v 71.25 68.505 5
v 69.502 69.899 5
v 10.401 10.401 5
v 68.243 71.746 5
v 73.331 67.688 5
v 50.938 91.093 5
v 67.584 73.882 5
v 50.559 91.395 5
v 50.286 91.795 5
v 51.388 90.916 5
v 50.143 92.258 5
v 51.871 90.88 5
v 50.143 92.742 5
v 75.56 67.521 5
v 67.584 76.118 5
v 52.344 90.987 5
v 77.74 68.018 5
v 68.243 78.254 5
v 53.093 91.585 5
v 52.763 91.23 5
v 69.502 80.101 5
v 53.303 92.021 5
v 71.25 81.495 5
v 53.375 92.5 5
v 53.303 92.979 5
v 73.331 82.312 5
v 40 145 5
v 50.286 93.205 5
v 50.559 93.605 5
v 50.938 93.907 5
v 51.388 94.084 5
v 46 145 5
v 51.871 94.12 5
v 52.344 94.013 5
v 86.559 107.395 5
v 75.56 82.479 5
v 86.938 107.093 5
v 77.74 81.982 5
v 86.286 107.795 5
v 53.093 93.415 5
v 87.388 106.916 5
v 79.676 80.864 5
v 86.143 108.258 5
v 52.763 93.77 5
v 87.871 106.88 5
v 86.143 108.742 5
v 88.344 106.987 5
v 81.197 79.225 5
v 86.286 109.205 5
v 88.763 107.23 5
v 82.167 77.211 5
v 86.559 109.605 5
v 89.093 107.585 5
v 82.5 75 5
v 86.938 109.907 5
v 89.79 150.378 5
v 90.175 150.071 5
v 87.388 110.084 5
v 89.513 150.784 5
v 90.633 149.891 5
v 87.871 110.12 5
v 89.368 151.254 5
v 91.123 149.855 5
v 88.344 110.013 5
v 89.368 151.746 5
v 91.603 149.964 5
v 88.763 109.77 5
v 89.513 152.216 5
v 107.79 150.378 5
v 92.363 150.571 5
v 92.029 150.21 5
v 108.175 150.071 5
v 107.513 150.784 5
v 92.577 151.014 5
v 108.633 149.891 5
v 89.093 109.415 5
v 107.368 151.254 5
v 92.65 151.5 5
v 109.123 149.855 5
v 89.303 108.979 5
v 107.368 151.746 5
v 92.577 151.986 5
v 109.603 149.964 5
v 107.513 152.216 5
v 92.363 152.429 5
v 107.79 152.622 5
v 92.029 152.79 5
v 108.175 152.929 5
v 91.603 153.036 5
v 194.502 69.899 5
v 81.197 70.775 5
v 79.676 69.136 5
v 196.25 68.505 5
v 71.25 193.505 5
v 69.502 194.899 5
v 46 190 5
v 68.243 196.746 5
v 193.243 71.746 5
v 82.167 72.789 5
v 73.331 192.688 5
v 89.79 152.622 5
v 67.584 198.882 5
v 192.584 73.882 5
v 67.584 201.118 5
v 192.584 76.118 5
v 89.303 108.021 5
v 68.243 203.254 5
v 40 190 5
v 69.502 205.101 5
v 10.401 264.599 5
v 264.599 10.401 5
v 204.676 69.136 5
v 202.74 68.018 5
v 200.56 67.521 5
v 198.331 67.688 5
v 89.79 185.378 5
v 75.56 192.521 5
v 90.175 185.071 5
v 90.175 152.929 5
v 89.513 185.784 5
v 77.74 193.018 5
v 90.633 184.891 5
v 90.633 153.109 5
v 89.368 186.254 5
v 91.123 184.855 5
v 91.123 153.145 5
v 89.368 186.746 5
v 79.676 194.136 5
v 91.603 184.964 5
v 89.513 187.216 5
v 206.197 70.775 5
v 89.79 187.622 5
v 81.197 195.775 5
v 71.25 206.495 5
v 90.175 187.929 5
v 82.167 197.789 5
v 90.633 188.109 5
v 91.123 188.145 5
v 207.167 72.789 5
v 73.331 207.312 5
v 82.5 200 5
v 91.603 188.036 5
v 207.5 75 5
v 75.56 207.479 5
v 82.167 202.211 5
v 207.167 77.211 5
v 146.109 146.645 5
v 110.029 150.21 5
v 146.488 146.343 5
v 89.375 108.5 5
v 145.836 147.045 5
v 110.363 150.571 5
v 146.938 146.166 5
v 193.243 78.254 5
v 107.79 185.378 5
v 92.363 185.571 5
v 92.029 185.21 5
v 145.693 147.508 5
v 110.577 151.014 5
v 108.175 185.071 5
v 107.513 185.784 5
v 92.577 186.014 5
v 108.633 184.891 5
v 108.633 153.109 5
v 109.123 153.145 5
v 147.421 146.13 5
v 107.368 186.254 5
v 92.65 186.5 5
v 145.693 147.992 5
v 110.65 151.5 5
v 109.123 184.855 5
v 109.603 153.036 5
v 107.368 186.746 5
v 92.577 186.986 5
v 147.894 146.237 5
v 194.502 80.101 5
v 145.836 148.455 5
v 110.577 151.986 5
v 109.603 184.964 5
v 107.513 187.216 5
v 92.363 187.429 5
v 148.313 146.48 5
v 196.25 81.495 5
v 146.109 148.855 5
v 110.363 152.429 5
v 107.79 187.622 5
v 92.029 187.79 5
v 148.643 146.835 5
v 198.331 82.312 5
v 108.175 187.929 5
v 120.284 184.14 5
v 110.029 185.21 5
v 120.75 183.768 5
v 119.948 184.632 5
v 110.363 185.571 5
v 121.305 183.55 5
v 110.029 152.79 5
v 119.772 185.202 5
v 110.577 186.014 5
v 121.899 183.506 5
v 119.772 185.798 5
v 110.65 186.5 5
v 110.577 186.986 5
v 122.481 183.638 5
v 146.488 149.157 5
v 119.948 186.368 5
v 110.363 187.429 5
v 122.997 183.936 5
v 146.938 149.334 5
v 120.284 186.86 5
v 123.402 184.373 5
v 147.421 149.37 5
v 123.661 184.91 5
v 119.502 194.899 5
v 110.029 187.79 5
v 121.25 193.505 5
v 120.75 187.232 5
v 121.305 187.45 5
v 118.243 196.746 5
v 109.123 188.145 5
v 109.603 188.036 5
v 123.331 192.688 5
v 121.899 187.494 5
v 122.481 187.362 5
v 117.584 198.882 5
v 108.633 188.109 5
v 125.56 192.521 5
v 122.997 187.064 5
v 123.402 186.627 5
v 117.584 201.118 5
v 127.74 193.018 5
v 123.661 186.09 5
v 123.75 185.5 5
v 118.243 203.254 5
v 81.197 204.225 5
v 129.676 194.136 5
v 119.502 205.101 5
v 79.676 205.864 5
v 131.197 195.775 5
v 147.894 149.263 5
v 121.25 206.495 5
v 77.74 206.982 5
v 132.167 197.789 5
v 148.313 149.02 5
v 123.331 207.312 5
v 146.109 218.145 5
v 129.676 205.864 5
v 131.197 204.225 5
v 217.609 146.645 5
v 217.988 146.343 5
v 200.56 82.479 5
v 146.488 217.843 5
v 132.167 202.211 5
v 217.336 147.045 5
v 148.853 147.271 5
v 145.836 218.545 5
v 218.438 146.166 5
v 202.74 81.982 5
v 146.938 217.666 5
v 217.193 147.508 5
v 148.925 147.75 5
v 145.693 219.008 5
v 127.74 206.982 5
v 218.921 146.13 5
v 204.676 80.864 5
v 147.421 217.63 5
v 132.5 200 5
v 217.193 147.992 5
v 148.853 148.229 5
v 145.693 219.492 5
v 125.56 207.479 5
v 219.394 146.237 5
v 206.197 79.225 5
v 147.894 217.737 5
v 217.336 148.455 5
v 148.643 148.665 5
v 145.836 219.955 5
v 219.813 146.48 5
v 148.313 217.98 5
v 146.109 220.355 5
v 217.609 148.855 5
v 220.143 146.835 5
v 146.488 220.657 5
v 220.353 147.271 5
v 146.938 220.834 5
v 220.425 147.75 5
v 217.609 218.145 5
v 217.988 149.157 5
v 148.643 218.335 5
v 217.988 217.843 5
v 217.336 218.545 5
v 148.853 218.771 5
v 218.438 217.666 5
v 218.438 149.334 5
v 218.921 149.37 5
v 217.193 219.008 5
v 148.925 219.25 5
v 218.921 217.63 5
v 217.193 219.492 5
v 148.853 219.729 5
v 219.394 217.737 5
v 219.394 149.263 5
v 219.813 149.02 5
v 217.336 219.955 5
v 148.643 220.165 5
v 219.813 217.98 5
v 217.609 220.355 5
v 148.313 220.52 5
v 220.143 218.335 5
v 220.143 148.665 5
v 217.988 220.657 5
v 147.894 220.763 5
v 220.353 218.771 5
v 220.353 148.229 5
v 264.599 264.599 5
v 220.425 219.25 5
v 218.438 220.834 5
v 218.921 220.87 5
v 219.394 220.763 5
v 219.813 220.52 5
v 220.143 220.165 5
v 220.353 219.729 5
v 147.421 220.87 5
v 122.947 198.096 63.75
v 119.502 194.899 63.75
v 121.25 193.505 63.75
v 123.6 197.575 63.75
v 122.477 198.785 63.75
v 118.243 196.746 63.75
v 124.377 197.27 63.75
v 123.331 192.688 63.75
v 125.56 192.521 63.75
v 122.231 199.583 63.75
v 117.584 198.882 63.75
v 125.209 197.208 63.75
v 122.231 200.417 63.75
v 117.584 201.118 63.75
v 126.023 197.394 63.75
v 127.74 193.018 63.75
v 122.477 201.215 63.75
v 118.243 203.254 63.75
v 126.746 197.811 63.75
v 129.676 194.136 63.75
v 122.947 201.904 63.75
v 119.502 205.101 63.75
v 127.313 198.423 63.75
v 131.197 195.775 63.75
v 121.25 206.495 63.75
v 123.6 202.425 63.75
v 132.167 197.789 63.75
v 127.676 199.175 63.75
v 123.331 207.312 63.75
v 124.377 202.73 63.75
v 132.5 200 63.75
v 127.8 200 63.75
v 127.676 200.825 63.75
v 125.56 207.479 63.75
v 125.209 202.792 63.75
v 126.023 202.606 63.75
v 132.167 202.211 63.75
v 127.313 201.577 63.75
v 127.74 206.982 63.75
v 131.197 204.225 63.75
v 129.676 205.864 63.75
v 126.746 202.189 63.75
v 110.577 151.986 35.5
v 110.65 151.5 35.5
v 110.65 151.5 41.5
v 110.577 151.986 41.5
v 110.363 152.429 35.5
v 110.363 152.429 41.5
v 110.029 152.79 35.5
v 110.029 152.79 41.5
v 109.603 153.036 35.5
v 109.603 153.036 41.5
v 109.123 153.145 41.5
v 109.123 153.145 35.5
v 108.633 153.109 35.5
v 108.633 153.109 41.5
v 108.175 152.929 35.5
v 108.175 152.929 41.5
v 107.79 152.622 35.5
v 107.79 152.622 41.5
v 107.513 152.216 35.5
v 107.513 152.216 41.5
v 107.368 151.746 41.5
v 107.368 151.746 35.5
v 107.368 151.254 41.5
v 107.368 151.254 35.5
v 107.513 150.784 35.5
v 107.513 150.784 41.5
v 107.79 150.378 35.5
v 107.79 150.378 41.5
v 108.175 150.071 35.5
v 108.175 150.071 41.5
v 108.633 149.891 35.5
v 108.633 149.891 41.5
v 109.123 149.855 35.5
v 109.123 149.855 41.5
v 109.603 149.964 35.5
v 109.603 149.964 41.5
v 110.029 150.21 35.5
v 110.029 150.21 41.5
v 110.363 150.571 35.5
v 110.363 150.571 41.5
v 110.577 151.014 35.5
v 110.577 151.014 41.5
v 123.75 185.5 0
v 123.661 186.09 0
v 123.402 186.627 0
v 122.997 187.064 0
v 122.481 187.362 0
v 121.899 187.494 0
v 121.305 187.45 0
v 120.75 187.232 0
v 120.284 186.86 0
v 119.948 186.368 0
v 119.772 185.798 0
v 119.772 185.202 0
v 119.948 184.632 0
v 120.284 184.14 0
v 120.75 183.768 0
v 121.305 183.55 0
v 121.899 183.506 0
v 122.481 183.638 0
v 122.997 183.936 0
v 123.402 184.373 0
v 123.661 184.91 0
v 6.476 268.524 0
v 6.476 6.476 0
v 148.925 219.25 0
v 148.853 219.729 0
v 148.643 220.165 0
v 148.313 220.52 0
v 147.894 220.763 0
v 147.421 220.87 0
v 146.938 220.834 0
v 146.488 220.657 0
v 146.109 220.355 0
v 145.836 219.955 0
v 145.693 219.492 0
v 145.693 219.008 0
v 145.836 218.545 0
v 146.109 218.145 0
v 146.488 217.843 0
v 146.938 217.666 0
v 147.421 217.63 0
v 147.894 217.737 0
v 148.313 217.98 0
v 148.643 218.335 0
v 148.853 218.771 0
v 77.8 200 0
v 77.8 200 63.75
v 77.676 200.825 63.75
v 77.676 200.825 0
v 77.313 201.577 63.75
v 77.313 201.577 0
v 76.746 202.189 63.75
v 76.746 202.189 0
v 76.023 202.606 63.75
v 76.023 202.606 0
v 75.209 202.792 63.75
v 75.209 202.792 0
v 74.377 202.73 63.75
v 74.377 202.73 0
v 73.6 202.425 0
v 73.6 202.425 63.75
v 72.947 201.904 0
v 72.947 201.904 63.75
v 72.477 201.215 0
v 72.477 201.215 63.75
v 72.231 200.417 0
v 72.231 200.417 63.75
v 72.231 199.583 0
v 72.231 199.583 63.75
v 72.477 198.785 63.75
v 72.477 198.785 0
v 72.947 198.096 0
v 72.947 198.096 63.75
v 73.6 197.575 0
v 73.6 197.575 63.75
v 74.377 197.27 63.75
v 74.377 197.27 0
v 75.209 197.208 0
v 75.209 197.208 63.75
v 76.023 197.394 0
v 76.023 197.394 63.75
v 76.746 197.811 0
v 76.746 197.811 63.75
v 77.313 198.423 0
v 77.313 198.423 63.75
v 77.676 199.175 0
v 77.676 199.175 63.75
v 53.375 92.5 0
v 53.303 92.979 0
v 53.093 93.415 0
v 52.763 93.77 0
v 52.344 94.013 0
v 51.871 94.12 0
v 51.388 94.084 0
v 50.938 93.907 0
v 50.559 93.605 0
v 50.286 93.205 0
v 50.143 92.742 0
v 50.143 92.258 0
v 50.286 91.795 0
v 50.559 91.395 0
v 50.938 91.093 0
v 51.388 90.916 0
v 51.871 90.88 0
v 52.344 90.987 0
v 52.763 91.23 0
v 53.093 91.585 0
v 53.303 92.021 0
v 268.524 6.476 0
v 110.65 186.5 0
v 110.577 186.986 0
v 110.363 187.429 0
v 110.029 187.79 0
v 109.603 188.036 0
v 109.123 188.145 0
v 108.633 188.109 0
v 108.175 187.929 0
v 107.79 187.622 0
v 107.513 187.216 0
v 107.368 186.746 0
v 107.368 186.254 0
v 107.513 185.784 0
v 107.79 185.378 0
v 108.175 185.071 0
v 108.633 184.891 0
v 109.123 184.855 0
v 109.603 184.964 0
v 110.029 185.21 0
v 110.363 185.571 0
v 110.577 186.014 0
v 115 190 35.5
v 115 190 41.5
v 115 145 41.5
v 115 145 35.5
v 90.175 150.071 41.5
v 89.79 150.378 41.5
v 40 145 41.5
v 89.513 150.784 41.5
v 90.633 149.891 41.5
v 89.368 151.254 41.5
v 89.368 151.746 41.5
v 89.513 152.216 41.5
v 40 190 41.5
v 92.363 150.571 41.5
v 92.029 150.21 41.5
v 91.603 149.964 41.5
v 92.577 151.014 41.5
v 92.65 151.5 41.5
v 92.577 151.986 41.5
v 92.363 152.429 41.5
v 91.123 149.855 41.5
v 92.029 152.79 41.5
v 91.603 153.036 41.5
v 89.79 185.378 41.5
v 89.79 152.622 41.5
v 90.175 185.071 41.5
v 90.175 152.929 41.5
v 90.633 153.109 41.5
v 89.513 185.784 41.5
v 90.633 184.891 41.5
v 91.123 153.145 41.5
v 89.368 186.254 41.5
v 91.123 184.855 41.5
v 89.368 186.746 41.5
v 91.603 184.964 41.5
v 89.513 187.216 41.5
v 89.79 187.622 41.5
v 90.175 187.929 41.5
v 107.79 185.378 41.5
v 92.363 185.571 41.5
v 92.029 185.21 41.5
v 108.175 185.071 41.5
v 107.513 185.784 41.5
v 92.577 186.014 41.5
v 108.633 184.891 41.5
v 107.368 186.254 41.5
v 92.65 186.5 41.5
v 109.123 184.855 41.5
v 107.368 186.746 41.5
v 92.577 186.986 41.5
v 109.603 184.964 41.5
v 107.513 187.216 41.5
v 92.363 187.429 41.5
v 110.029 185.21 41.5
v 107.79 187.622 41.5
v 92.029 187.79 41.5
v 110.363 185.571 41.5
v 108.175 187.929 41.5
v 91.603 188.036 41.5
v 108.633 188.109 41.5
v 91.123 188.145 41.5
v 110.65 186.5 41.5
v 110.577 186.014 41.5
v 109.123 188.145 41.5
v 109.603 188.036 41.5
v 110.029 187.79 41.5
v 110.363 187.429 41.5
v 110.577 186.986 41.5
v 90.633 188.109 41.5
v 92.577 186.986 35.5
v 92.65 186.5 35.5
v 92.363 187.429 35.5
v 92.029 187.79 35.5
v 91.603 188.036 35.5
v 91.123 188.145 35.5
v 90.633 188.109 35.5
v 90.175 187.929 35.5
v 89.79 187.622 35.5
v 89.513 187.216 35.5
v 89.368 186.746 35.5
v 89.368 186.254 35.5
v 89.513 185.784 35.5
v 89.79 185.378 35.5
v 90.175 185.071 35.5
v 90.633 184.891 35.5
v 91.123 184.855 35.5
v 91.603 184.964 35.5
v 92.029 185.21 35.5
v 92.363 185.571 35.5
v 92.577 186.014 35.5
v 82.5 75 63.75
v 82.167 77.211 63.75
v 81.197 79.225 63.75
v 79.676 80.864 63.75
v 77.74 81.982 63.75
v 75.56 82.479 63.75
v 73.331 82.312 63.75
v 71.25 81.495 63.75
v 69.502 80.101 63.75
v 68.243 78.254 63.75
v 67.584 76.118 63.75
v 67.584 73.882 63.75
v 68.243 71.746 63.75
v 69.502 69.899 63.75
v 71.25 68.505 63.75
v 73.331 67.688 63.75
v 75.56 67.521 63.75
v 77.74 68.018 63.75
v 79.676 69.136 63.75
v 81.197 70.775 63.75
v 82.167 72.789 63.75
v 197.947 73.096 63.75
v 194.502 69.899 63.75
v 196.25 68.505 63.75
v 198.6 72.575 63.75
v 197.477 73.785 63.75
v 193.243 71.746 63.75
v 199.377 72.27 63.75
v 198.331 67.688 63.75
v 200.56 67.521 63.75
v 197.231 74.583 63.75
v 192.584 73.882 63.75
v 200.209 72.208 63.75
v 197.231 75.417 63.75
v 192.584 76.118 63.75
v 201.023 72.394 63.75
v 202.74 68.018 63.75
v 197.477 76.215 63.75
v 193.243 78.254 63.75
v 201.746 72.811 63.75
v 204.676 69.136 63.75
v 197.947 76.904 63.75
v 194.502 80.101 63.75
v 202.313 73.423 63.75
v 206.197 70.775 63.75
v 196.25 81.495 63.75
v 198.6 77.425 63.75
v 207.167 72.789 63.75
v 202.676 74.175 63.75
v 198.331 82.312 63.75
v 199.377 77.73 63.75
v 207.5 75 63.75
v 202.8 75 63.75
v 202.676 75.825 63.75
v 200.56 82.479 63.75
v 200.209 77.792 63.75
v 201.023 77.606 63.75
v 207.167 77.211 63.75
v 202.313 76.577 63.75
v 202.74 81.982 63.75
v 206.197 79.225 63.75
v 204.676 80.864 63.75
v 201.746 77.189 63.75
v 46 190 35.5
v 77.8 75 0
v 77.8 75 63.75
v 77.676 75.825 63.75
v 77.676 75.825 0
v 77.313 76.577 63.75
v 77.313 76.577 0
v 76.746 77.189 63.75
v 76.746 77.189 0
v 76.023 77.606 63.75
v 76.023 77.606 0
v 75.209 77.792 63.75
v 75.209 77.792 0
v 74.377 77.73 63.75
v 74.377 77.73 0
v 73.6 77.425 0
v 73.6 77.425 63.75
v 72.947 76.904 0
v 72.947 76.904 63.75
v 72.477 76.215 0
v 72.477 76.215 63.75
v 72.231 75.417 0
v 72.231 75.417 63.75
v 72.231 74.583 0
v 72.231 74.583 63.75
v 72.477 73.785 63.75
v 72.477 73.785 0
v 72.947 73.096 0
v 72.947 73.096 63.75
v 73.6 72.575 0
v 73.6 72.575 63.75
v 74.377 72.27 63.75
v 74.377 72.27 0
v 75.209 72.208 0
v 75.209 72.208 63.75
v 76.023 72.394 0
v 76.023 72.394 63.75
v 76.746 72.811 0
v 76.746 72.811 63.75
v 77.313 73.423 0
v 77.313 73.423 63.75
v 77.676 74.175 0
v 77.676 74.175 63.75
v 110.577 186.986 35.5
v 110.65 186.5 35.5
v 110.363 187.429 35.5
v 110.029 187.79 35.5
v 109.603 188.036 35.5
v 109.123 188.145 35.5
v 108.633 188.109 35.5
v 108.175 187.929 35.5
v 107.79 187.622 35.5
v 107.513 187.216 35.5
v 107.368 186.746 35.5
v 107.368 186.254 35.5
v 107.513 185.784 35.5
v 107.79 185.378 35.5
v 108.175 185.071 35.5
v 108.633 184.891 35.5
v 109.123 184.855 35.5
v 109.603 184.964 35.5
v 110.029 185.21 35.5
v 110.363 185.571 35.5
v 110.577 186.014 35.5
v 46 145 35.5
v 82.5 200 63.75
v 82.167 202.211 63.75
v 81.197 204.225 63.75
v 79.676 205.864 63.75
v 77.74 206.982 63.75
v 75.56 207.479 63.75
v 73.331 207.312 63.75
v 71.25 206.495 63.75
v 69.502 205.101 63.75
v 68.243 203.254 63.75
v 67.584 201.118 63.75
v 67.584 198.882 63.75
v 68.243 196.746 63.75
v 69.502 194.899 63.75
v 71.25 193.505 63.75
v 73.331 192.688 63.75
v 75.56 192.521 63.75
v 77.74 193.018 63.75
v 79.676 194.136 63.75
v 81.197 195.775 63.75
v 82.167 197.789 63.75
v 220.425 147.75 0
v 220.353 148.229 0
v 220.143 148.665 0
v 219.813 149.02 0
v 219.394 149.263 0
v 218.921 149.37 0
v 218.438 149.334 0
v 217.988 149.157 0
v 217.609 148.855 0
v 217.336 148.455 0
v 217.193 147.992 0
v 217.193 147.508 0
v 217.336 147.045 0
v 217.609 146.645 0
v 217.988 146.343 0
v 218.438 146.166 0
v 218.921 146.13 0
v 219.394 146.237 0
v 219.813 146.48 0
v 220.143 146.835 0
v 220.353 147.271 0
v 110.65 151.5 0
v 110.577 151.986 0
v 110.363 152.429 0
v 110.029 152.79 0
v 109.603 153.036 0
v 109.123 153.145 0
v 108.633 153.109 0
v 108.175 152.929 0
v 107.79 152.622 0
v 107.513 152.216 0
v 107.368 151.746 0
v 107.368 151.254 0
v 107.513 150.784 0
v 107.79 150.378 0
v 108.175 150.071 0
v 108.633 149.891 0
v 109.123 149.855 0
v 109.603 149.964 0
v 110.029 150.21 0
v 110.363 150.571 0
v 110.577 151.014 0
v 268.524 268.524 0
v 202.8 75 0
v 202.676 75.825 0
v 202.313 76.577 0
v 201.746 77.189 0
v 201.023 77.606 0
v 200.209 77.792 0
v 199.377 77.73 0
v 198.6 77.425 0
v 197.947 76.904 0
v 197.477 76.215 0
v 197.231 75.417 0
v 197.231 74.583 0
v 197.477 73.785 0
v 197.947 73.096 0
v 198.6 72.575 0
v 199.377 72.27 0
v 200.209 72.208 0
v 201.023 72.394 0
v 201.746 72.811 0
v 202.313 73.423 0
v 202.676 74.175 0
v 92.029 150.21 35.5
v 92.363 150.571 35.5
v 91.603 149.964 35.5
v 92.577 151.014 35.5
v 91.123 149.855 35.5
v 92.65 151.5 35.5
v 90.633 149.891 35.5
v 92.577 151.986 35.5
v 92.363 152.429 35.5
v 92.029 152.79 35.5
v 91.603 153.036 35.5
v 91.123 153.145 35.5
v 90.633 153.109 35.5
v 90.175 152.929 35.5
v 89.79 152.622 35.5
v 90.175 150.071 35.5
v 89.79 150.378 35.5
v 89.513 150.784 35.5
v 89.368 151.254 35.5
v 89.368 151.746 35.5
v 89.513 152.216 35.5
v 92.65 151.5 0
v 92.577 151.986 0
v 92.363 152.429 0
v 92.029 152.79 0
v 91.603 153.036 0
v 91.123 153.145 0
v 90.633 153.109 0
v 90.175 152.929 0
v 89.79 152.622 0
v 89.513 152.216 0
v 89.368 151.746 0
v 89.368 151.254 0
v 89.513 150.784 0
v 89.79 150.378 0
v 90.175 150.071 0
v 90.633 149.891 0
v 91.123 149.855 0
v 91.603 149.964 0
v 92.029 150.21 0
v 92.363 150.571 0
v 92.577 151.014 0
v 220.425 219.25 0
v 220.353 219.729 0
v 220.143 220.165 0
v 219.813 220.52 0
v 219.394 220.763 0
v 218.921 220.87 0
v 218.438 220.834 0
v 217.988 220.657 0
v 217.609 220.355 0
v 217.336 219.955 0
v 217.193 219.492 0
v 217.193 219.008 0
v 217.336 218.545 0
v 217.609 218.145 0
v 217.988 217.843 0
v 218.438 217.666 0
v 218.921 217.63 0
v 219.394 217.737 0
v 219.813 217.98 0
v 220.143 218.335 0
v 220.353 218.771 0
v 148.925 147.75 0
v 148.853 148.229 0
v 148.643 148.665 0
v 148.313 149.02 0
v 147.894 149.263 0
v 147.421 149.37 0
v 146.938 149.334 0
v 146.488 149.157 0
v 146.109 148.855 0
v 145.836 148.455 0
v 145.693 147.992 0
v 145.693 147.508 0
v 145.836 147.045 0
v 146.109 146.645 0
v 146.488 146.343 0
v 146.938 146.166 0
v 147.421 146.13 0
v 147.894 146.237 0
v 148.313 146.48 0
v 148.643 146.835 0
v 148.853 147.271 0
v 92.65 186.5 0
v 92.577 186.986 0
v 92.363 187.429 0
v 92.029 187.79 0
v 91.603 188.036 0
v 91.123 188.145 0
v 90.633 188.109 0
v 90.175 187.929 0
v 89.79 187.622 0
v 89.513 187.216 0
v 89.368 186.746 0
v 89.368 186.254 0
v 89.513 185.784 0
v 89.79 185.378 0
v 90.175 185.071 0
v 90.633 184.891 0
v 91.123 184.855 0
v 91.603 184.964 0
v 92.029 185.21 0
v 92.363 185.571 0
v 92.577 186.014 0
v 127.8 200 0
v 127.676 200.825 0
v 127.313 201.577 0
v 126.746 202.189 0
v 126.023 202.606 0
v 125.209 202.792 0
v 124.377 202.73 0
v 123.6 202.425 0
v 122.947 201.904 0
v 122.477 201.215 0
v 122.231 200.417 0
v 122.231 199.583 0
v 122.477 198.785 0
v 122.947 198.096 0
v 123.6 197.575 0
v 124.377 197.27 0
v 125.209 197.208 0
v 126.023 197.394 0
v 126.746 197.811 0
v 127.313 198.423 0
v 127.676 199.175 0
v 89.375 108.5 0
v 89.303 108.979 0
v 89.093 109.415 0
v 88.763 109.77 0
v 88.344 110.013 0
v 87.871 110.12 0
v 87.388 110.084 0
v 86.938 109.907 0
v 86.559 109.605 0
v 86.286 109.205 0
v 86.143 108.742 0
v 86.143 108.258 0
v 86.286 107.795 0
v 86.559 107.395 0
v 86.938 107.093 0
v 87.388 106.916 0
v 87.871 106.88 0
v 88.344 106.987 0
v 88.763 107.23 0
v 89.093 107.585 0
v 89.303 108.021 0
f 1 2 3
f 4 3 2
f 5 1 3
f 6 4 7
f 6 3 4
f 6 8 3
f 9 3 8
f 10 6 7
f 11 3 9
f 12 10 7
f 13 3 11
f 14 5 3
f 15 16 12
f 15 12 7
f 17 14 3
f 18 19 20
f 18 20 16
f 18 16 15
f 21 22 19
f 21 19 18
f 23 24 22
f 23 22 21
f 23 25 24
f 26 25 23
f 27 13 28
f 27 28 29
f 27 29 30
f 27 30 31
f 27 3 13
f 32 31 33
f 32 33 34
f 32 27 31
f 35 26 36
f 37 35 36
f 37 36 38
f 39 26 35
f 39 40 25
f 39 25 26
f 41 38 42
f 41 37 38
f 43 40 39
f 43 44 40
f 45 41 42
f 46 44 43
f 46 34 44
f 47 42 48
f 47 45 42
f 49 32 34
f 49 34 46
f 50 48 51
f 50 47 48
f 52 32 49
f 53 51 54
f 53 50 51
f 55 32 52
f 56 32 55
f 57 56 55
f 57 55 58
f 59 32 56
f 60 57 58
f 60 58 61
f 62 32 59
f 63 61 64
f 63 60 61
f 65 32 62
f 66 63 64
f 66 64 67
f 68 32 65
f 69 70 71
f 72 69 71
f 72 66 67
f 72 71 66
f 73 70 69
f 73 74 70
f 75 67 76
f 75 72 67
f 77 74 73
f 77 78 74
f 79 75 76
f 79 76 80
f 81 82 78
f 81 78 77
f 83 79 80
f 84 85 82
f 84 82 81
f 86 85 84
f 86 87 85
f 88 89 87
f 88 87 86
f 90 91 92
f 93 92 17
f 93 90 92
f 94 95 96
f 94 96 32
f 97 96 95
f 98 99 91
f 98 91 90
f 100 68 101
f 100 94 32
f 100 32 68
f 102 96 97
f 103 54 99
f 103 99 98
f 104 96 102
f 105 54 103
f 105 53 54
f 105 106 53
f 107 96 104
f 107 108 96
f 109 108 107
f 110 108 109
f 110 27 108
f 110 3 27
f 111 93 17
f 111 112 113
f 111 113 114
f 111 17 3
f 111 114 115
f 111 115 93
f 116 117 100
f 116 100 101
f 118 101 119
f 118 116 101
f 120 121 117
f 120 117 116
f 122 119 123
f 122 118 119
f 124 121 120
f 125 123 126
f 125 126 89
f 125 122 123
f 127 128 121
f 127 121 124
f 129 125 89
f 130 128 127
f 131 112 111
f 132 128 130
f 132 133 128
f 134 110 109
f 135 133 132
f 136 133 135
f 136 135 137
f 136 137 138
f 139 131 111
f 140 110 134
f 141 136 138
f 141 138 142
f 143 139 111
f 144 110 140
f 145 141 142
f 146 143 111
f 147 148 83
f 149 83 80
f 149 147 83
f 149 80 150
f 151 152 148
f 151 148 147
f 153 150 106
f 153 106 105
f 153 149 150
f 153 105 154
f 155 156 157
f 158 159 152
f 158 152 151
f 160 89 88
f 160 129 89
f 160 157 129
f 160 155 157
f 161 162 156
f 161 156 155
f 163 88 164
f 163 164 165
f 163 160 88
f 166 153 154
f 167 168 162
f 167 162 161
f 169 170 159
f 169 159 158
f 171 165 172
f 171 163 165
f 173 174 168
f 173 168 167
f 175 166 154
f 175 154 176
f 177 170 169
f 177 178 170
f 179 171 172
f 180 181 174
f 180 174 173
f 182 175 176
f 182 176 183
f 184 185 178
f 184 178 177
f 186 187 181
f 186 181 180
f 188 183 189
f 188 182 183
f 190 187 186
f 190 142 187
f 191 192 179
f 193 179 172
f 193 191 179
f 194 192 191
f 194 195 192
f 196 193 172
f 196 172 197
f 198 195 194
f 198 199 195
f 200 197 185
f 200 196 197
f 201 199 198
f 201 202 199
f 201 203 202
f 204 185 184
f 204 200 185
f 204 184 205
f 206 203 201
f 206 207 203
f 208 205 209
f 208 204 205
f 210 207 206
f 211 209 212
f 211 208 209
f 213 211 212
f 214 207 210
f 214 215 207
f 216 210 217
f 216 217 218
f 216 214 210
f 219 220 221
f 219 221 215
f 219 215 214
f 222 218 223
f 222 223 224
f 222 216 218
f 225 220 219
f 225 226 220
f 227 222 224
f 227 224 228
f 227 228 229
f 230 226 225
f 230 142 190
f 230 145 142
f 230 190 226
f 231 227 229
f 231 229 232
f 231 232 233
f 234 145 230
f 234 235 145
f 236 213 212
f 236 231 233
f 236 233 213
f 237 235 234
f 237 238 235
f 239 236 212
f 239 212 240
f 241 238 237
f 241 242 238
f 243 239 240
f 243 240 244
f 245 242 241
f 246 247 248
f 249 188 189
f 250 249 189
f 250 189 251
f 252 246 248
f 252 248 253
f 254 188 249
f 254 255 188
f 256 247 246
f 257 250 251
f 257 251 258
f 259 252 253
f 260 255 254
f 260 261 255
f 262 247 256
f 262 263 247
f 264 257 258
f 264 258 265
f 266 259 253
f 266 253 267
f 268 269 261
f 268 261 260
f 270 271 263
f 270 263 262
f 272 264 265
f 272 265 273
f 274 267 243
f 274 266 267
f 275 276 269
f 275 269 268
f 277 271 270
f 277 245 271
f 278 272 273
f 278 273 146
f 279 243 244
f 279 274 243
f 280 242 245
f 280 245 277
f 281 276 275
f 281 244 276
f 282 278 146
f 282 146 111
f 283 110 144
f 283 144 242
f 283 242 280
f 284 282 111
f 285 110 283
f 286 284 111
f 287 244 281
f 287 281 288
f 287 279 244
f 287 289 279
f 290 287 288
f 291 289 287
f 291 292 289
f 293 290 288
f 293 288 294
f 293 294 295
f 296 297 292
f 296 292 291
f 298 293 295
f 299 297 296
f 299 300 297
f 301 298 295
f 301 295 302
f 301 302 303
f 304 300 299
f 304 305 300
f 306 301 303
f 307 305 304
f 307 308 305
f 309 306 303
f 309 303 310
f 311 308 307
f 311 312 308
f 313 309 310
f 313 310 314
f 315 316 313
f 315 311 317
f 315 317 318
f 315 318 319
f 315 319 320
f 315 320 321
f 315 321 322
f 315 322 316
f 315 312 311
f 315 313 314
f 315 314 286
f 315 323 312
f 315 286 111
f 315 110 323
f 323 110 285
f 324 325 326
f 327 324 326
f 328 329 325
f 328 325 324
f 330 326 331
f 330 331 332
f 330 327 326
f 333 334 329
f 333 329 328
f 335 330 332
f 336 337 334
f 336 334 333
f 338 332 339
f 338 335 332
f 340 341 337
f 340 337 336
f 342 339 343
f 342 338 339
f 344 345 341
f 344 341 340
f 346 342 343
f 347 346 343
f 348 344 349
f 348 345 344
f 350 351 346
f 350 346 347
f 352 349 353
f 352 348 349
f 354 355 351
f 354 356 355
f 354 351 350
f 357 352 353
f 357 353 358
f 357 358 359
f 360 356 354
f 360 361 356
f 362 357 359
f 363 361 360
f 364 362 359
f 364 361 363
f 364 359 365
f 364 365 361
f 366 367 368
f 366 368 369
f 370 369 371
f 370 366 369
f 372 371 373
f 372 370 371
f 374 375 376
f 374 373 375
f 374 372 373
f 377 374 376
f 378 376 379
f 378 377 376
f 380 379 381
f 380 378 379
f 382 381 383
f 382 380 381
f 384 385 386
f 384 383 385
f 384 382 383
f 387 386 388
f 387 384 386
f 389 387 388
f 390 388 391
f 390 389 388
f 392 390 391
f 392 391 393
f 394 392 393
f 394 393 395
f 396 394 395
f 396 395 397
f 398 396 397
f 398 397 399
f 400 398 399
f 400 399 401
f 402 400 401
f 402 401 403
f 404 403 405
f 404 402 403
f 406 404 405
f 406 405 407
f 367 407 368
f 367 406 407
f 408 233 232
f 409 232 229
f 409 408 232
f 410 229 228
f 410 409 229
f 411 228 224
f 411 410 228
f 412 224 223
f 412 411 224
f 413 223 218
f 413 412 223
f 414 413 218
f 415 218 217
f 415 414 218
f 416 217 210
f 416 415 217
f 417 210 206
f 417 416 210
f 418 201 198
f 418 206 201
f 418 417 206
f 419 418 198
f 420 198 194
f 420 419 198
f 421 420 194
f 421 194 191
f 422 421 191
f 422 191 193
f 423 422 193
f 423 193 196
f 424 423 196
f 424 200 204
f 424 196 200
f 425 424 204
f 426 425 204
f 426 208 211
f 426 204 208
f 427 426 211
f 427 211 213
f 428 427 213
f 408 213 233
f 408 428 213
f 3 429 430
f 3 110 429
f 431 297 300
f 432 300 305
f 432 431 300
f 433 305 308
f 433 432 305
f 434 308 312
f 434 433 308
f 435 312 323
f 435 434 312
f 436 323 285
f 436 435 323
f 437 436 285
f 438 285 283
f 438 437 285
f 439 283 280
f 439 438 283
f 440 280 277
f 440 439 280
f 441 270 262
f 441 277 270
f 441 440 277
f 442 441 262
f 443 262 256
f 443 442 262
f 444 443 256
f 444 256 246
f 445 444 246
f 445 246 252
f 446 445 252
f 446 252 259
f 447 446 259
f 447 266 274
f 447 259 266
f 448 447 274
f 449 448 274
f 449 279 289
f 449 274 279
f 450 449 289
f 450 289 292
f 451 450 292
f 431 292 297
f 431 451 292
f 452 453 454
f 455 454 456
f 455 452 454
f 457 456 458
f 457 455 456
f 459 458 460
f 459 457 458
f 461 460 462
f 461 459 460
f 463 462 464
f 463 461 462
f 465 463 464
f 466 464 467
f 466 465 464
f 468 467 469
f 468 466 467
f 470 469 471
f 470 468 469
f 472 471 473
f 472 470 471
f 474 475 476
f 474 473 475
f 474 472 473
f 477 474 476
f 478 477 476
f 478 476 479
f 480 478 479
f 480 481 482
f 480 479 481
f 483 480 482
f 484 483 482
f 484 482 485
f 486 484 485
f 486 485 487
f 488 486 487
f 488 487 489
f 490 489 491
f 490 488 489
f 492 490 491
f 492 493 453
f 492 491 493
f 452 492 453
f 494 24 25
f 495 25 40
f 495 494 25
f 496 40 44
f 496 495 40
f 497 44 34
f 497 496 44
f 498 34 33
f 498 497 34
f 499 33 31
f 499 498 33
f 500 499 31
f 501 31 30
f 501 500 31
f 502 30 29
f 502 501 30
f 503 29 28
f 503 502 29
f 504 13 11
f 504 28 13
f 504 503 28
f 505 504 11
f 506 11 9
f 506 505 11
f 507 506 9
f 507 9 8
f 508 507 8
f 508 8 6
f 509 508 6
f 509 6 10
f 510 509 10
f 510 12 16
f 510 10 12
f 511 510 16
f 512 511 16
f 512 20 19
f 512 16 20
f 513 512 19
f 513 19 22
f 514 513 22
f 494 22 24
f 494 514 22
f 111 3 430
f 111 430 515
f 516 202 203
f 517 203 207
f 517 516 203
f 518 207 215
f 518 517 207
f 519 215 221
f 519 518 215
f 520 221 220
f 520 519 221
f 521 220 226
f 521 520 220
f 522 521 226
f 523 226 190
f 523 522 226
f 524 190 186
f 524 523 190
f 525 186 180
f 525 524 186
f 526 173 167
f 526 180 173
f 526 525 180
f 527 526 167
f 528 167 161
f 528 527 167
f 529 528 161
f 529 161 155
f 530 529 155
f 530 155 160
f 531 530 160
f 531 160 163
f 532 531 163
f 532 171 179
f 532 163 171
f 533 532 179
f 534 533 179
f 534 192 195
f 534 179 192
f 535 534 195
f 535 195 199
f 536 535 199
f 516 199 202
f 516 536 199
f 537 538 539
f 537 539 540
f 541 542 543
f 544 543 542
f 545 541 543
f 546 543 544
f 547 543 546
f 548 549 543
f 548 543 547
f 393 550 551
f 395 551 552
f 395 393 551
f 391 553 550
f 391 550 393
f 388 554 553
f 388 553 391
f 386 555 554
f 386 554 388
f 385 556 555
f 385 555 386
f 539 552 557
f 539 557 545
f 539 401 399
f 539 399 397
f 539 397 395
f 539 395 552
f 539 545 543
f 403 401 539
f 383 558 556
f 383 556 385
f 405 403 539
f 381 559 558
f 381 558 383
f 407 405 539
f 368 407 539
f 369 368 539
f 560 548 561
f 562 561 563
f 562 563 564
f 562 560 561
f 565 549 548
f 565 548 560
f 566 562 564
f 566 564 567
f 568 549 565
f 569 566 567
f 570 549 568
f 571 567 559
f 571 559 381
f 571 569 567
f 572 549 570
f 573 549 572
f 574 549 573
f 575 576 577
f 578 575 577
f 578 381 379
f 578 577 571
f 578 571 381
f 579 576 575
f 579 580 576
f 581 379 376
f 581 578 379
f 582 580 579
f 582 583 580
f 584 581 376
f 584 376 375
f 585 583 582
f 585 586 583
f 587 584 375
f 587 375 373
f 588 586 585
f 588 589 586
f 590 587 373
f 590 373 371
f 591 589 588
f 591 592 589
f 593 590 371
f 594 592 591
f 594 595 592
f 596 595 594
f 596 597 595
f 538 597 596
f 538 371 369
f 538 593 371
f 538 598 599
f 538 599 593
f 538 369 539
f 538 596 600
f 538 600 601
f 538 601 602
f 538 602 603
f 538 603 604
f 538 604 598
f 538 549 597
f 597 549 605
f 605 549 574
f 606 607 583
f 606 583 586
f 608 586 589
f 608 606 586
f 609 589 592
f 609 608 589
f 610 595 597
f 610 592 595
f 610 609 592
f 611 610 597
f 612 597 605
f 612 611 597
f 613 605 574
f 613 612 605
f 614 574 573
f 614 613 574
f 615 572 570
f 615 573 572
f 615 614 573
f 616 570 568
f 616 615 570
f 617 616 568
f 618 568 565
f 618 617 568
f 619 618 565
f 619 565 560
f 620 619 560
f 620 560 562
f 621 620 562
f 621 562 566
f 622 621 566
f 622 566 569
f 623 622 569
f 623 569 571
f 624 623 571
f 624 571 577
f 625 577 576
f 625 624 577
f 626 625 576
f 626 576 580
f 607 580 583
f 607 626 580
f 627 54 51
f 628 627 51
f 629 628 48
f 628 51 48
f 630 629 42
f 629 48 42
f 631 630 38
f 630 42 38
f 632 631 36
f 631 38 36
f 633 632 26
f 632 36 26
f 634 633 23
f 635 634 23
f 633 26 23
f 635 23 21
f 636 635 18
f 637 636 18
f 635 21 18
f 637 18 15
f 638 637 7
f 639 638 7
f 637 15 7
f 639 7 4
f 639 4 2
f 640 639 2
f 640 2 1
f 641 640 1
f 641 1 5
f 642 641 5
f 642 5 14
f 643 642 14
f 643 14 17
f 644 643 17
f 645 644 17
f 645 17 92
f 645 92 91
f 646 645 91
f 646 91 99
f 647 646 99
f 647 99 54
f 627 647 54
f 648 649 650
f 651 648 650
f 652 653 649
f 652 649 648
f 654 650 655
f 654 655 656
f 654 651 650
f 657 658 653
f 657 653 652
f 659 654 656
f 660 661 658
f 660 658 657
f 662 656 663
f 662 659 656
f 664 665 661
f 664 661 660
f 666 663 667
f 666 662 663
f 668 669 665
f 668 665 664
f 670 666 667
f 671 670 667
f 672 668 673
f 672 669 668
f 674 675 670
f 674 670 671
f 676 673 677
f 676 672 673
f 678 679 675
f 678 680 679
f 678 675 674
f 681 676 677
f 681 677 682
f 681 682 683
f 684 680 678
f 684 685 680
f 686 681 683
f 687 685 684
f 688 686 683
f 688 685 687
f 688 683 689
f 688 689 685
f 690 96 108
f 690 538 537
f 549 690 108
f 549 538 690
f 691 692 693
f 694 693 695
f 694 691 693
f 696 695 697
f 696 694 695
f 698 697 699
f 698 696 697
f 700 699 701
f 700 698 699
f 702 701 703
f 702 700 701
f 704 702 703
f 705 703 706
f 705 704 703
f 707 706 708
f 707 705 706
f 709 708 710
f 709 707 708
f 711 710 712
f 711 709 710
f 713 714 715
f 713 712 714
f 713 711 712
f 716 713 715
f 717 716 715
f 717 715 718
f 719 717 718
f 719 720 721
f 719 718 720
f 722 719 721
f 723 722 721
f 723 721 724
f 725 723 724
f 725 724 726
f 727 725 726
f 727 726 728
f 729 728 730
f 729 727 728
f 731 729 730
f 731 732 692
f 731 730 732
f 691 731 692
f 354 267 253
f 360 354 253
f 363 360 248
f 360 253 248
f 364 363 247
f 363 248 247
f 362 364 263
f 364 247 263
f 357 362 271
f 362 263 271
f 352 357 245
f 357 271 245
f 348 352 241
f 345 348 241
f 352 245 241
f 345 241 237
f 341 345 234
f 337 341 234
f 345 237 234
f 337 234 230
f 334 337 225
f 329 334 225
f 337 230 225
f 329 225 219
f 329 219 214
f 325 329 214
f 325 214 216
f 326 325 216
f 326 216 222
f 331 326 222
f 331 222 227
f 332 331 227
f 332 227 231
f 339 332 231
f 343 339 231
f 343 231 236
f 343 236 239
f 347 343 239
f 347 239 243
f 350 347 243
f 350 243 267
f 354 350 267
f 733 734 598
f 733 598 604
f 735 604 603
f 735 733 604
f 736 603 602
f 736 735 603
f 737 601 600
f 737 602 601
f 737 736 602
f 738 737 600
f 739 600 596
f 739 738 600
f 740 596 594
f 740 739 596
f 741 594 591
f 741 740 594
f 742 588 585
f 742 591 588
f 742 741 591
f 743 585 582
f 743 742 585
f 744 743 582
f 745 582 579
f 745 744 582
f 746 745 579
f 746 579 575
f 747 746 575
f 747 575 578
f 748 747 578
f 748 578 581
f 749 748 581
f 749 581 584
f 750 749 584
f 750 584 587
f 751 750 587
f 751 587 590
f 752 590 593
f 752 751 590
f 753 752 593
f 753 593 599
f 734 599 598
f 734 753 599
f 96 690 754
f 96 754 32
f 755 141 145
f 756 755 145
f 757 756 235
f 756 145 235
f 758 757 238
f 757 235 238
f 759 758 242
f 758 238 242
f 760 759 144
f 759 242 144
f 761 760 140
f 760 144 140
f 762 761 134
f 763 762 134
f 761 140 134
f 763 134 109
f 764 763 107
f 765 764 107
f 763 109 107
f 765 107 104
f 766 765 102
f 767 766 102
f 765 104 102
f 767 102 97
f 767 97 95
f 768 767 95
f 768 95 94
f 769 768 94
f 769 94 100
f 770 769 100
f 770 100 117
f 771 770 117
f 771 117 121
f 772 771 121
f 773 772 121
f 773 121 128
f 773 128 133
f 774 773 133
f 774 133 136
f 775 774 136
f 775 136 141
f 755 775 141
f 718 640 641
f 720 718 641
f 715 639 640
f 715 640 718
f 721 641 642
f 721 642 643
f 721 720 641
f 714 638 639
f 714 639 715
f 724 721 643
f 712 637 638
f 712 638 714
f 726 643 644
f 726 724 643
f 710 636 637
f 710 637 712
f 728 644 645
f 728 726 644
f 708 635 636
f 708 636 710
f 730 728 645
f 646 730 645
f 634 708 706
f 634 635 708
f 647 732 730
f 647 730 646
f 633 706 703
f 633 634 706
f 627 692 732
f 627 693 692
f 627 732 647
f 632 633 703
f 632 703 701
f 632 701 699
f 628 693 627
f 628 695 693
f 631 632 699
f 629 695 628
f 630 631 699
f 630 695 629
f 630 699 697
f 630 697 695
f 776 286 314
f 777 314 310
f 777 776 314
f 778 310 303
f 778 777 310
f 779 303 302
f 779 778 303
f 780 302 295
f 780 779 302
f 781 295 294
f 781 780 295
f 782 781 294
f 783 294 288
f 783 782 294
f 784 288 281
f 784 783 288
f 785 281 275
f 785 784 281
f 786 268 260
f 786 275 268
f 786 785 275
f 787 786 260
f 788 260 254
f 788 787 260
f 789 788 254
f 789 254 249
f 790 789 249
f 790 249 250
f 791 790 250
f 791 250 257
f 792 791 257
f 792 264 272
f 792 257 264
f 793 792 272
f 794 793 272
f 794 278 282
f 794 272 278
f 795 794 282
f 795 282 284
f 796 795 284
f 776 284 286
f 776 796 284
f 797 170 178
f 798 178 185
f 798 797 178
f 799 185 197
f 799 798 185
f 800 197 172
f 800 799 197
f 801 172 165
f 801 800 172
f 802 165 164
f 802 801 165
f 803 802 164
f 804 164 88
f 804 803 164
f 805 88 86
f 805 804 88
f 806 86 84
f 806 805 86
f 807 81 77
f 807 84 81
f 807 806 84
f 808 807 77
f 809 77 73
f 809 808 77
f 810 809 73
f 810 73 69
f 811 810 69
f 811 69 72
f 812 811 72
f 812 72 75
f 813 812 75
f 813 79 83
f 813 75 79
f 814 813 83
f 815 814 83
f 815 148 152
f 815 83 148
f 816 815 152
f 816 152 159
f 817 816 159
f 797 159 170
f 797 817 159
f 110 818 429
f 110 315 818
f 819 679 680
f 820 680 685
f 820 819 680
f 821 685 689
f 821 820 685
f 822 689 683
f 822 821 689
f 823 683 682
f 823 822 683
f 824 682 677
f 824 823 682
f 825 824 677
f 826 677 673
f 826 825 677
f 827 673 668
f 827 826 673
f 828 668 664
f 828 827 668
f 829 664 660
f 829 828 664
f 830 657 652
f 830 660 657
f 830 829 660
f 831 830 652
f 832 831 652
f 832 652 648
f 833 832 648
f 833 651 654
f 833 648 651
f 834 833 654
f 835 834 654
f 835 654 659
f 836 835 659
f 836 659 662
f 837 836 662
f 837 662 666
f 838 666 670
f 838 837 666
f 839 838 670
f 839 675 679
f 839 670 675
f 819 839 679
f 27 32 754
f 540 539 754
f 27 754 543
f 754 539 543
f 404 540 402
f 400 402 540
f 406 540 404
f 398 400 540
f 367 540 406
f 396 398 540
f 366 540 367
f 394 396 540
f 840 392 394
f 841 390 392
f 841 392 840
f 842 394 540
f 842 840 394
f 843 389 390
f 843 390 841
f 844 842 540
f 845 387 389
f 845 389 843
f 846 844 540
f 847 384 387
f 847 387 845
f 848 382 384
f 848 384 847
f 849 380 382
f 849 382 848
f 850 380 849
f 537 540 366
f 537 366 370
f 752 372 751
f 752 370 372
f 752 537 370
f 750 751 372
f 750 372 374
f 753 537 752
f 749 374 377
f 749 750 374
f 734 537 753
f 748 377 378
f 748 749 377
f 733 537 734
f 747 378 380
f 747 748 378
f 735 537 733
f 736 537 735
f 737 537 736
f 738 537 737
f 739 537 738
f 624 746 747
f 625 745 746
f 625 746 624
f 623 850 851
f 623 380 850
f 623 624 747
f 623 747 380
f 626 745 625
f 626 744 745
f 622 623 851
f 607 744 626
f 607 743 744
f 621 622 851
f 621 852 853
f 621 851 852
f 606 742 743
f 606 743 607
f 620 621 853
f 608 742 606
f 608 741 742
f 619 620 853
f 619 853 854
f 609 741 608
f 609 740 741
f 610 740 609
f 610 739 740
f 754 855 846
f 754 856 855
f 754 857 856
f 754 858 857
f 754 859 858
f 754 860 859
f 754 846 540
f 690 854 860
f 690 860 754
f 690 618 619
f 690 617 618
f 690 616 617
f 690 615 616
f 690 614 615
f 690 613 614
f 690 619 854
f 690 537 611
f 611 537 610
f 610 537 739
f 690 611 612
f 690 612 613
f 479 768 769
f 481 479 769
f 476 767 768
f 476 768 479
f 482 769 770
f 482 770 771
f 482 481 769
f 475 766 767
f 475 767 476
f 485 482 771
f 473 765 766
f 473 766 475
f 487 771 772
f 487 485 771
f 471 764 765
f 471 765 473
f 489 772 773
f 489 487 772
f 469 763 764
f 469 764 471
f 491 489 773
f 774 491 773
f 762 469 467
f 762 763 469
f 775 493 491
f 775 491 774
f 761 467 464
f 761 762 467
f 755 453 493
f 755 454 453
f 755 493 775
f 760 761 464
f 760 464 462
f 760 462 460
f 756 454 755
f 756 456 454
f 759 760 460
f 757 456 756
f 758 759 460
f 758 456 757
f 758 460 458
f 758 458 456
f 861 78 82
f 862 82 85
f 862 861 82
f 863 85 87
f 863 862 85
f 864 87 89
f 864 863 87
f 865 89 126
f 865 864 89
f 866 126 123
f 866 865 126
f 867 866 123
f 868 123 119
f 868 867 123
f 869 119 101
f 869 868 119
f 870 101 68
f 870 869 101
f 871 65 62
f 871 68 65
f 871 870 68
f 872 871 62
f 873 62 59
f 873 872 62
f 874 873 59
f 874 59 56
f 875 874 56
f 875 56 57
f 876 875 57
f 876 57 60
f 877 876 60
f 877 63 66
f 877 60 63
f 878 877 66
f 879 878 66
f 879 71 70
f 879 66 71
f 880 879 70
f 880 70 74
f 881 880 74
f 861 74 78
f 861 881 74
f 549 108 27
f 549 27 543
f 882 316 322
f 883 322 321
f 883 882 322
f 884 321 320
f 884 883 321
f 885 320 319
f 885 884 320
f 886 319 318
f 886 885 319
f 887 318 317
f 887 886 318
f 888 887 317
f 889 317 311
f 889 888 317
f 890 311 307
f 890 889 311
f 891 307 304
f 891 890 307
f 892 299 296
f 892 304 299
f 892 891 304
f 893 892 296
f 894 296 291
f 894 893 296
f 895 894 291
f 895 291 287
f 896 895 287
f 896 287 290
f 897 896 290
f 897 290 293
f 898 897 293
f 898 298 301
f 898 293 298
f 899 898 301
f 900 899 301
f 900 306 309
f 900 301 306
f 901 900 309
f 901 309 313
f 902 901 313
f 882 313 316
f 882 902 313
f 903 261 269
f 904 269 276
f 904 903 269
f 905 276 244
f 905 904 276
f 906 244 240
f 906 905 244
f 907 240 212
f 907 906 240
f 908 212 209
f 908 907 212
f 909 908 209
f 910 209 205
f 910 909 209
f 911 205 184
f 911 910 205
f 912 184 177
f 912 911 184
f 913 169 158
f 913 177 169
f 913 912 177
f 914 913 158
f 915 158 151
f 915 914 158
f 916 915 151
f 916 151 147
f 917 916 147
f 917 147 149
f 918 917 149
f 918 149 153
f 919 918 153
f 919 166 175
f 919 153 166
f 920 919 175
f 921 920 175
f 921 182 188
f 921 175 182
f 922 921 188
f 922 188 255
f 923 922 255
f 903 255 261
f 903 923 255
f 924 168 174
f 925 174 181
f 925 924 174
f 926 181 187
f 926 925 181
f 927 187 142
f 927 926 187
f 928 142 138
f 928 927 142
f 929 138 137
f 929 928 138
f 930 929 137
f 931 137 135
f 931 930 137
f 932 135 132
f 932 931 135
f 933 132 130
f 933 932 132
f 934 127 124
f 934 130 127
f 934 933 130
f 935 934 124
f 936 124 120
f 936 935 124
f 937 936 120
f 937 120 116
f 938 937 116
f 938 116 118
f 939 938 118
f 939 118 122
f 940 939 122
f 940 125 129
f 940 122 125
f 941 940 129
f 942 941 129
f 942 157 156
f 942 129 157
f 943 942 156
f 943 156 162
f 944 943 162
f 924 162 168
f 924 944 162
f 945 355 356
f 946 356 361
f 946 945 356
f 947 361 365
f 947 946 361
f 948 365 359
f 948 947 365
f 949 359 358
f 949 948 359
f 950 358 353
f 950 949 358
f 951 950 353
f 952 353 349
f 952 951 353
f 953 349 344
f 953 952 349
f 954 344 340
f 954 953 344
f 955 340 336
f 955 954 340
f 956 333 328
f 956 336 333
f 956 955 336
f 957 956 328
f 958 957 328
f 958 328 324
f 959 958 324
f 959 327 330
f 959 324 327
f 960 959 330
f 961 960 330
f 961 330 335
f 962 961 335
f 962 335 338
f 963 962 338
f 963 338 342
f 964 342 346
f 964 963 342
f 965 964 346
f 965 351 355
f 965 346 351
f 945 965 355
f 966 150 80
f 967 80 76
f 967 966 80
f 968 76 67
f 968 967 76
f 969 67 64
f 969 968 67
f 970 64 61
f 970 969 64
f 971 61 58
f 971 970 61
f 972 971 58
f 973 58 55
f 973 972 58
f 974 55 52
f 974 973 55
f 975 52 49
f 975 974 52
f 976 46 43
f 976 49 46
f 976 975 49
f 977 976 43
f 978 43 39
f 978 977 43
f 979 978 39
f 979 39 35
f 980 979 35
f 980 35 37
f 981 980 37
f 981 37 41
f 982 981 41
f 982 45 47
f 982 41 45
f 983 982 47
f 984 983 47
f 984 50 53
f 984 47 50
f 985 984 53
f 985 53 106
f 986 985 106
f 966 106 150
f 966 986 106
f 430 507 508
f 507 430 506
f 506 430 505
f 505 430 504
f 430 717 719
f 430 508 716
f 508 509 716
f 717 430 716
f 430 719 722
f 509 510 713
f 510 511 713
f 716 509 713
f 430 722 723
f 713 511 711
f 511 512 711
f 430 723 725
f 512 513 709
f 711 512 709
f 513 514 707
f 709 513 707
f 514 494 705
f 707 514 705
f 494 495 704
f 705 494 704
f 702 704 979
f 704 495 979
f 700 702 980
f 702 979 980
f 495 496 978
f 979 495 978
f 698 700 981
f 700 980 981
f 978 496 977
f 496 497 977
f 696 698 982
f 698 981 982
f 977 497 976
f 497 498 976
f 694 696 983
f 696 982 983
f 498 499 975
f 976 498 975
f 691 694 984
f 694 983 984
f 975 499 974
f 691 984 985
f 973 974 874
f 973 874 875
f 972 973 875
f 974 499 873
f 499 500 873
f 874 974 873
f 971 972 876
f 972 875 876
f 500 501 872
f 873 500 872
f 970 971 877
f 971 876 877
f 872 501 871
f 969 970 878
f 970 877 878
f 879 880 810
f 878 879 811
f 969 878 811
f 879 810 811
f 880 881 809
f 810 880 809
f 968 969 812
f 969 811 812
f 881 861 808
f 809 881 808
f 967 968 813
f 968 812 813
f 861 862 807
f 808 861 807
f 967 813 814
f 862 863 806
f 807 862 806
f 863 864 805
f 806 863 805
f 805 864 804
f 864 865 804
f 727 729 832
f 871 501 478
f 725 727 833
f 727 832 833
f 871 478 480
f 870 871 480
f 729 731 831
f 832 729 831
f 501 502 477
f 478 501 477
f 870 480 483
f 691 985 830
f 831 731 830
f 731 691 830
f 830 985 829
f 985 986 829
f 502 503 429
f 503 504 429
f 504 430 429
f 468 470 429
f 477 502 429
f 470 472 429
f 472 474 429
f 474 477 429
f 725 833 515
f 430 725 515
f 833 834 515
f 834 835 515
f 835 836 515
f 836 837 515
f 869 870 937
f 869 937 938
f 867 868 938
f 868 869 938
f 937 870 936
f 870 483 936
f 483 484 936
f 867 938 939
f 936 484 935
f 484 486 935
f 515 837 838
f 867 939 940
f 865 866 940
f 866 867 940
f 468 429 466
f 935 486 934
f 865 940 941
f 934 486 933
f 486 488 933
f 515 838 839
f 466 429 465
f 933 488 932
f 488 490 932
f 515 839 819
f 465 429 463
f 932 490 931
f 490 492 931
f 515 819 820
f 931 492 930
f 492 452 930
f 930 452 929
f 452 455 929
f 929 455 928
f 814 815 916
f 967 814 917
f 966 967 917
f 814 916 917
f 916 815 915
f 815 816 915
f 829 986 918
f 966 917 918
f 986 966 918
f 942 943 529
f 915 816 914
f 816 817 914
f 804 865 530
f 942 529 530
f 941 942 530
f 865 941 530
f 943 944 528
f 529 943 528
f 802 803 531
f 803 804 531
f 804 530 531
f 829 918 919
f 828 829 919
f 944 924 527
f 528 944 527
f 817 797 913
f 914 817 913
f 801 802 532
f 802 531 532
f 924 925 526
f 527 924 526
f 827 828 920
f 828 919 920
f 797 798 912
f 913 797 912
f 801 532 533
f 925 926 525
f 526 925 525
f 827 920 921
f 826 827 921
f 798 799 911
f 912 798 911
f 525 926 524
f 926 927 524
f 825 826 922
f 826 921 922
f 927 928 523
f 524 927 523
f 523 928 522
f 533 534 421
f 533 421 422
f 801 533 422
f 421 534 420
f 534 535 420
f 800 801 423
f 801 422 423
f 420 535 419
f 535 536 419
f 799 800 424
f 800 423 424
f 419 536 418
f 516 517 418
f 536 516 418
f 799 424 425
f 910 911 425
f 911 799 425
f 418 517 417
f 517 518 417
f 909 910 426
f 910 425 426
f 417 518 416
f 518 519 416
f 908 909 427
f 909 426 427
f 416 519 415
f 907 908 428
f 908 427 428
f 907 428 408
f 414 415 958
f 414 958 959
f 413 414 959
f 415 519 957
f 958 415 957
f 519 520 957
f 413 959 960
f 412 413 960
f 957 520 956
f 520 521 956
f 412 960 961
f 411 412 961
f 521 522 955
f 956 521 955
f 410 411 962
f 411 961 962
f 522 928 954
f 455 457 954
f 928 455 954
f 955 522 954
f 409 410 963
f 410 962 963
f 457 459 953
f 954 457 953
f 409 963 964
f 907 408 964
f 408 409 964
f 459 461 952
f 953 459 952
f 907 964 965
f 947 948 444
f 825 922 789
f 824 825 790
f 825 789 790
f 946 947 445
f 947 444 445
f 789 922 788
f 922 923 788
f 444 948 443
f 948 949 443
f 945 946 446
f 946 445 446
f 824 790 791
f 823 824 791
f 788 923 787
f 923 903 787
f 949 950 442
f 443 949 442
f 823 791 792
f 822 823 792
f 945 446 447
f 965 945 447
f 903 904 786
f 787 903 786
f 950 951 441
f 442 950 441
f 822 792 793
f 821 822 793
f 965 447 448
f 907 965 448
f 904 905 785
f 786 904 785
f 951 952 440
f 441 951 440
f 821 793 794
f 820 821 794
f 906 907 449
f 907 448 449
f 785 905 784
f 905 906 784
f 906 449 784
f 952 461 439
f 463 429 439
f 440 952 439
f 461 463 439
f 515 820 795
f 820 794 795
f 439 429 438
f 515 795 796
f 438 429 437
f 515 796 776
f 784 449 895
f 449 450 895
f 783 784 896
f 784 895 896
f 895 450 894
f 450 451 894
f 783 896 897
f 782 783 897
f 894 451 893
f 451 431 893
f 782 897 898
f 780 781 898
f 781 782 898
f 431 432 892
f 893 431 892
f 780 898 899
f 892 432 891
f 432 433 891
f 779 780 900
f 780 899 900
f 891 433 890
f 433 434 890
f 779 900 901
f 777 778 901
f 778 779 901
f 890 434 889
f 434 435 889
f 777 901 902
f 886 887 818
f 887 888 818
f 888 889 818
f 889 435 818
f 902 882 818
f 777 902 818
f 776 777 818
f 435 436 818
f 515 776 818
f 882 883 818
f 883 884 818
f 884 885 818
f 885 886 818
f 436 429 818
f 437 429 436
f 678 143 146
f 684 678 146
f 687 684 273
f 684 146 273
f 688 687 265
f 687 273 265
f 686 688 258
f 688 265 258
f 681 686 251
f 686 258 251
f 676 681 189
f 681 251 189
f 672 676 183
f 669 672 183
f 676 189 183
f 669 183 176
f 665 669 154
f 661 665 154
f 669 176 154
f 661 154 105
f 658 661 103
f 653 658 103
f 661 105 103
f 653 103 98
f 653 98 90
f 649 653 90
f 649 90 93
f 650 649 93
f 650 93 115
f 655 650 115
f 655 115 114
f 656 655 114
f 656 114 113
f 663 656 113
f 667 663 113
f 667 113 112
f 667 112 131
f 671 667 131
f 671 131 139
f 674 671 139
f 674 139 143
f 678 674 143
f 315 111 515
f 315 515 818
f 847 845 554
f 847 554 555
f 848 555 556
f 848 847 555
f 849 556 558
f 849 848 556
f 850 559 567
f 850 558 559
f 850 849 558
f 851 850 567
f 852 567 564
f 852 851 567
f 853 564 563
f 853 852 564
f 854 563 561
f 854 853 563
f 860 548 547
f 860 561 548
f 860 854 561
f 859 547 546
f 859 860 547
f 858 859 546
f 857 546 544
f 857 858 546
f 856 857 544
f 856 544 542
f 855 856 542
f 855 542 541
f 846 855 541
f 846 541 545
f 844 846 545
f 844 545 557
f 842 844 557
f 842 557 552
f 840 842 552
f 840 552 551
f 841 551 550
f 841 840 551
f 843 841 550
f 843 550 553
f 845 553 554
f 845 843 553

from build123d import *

# Parameters (mm, degrees)
SKETCH027_R      = 1.625
SKETCH027_R_2    = 2
SKETCH027_R_3    = 2.8
SKETCH027_R_4    = 1.65
EXTRUDE004_DEPTH = 80
EXTRUDE003_DEPTH = 45
SKETCH025_W      = 275
SKETCH025_H      = 275
EXTRUDE002_DEPTH = 5
SKETCH023_W      = 275
SKETCH023_H      = 275
SKETCH024_W      = 0.1
SKETCH024_H      = 0.1
SKETCH_R         = 7.5
EXTRUDE001_DEPTH = 63.75


with BuildPart() as extrude004:
    # Sketch027 → Extrude004 (new body)
    with BuildSketch(Plane.XY):
        with Locations((51.75, 92.5)):
            Circle(SKETCH027_R)
        with Locations((87.75, 108.5)):
            Circle(SKETCH027_R)
        with Locations((121.75, 185.5)):
            Circle(SKETCH027_R_2)
        with Locations((147.3, 147.75)):
            Circle(SKETCH027_R)
        with Locations((218.8, 147.75)):
            Circle(SKETCH027_R)
        with Locations((218.8, 219.25)):
            Circle(SKETCH027_R)
        with Locations((147.3, 219.25)):
            Circle(SKETCH027_R)
        with Locations((75, 200)):
            Circle(SKETCH027_R_3)
        with Locations((125, 200)):
            Circle(SKETCH027_R_3)
        with Locations((200, 75)):
            Circle(SKETCH027_R_3)
        with Locations((75, 75)):
            Circle(SKETCH027_R_3)
        with Locations((91, 186.5)):
            Circle(SKETCH027_R_4)
        with Locations((109, 186.5)):
            Circle(SKETCH027_R_4)
        with Locations((91, 151.5)):
            Circle(SKETCH027_R_4)
        with Locations((109, 151.5)):
            Circle(SKETCH027_R_4)
    extrude(amount=EXTRUDE004_DEPTH)


with BuildPart() as extrude003:
    # Sketch026 → Extrude003 (new body)
    with BuildSketch(Plane.XZ):
        Polygon((46, 5), (40, 5), (40, 41.5), (115, 41.5), (115, 35.5), (46, 35.5), align=None)
    extrude(amount=EXTRUDE003_DEPTH)


with BuildPart() as extrude003_1:
    # Extrude003 placement: moved
    add(extrude003.part.moved(Location((0, 190, 0))))


with BuildPart() as level01s001:
    # Sketch025 → Extrude002 (new body)
    with BuildSketch(Plane.XY):
        with Locations((137.5, 137.5)):
            Rectangle(SKETCH025_W, SKETCH025_H)
    extrude(amount=EXTRUDE002_DEPTH)


with BuildPart() as baselevel:
    # Sketch023 → Loft004 section 0
    with BuildSketch(Plane.XY):
        with Locations((137.5, 137.5)):
            Rectangle(SKETCH023_W, SKETCH023_H)
    # Sketch024 → Loft004 section 1
    with BuildSketch(Plane.XY.offset(175.1)):
        with Locations((137.5, 137.5)):
            Rectangle(SKETCH024_W, SKETCH024_H)
    loft()


with BuildPart() as baselevel_1:
    # Loft004 placement: moved
    add(baselevel.part.moved(Location((0, 0, -8.25))))

    # Common001: intersect level01s001
    add(level01s001.part, mode=Mode.INTERSECT)


with BuildPart() as level02:
    # Sketch → Extrude001 (new body)
    with BuildSketch(Plane.XY):
        with Locations((75, 200)):
            Circle(SKETCH_R)
        with Locations((125, 200)):
            Circle(SKETCH_R)
        with Locations((75, 75)):
            Circle(SKETCH_R)
        with Locations((200, 75)):
            Circle(SKETCH_R)
    extrude(amount=EXTRUDE001_DEPTH)

    # Fusion: union BaseLevel
    add(baselevel_1.part)

    # Fusion056: union Extrude003
    add(extrude003_1.part)

    # Cut001: cut Extrude004
    add(extrude004.part, mode=Mode.SUBTRACT)


solid = level02.part
